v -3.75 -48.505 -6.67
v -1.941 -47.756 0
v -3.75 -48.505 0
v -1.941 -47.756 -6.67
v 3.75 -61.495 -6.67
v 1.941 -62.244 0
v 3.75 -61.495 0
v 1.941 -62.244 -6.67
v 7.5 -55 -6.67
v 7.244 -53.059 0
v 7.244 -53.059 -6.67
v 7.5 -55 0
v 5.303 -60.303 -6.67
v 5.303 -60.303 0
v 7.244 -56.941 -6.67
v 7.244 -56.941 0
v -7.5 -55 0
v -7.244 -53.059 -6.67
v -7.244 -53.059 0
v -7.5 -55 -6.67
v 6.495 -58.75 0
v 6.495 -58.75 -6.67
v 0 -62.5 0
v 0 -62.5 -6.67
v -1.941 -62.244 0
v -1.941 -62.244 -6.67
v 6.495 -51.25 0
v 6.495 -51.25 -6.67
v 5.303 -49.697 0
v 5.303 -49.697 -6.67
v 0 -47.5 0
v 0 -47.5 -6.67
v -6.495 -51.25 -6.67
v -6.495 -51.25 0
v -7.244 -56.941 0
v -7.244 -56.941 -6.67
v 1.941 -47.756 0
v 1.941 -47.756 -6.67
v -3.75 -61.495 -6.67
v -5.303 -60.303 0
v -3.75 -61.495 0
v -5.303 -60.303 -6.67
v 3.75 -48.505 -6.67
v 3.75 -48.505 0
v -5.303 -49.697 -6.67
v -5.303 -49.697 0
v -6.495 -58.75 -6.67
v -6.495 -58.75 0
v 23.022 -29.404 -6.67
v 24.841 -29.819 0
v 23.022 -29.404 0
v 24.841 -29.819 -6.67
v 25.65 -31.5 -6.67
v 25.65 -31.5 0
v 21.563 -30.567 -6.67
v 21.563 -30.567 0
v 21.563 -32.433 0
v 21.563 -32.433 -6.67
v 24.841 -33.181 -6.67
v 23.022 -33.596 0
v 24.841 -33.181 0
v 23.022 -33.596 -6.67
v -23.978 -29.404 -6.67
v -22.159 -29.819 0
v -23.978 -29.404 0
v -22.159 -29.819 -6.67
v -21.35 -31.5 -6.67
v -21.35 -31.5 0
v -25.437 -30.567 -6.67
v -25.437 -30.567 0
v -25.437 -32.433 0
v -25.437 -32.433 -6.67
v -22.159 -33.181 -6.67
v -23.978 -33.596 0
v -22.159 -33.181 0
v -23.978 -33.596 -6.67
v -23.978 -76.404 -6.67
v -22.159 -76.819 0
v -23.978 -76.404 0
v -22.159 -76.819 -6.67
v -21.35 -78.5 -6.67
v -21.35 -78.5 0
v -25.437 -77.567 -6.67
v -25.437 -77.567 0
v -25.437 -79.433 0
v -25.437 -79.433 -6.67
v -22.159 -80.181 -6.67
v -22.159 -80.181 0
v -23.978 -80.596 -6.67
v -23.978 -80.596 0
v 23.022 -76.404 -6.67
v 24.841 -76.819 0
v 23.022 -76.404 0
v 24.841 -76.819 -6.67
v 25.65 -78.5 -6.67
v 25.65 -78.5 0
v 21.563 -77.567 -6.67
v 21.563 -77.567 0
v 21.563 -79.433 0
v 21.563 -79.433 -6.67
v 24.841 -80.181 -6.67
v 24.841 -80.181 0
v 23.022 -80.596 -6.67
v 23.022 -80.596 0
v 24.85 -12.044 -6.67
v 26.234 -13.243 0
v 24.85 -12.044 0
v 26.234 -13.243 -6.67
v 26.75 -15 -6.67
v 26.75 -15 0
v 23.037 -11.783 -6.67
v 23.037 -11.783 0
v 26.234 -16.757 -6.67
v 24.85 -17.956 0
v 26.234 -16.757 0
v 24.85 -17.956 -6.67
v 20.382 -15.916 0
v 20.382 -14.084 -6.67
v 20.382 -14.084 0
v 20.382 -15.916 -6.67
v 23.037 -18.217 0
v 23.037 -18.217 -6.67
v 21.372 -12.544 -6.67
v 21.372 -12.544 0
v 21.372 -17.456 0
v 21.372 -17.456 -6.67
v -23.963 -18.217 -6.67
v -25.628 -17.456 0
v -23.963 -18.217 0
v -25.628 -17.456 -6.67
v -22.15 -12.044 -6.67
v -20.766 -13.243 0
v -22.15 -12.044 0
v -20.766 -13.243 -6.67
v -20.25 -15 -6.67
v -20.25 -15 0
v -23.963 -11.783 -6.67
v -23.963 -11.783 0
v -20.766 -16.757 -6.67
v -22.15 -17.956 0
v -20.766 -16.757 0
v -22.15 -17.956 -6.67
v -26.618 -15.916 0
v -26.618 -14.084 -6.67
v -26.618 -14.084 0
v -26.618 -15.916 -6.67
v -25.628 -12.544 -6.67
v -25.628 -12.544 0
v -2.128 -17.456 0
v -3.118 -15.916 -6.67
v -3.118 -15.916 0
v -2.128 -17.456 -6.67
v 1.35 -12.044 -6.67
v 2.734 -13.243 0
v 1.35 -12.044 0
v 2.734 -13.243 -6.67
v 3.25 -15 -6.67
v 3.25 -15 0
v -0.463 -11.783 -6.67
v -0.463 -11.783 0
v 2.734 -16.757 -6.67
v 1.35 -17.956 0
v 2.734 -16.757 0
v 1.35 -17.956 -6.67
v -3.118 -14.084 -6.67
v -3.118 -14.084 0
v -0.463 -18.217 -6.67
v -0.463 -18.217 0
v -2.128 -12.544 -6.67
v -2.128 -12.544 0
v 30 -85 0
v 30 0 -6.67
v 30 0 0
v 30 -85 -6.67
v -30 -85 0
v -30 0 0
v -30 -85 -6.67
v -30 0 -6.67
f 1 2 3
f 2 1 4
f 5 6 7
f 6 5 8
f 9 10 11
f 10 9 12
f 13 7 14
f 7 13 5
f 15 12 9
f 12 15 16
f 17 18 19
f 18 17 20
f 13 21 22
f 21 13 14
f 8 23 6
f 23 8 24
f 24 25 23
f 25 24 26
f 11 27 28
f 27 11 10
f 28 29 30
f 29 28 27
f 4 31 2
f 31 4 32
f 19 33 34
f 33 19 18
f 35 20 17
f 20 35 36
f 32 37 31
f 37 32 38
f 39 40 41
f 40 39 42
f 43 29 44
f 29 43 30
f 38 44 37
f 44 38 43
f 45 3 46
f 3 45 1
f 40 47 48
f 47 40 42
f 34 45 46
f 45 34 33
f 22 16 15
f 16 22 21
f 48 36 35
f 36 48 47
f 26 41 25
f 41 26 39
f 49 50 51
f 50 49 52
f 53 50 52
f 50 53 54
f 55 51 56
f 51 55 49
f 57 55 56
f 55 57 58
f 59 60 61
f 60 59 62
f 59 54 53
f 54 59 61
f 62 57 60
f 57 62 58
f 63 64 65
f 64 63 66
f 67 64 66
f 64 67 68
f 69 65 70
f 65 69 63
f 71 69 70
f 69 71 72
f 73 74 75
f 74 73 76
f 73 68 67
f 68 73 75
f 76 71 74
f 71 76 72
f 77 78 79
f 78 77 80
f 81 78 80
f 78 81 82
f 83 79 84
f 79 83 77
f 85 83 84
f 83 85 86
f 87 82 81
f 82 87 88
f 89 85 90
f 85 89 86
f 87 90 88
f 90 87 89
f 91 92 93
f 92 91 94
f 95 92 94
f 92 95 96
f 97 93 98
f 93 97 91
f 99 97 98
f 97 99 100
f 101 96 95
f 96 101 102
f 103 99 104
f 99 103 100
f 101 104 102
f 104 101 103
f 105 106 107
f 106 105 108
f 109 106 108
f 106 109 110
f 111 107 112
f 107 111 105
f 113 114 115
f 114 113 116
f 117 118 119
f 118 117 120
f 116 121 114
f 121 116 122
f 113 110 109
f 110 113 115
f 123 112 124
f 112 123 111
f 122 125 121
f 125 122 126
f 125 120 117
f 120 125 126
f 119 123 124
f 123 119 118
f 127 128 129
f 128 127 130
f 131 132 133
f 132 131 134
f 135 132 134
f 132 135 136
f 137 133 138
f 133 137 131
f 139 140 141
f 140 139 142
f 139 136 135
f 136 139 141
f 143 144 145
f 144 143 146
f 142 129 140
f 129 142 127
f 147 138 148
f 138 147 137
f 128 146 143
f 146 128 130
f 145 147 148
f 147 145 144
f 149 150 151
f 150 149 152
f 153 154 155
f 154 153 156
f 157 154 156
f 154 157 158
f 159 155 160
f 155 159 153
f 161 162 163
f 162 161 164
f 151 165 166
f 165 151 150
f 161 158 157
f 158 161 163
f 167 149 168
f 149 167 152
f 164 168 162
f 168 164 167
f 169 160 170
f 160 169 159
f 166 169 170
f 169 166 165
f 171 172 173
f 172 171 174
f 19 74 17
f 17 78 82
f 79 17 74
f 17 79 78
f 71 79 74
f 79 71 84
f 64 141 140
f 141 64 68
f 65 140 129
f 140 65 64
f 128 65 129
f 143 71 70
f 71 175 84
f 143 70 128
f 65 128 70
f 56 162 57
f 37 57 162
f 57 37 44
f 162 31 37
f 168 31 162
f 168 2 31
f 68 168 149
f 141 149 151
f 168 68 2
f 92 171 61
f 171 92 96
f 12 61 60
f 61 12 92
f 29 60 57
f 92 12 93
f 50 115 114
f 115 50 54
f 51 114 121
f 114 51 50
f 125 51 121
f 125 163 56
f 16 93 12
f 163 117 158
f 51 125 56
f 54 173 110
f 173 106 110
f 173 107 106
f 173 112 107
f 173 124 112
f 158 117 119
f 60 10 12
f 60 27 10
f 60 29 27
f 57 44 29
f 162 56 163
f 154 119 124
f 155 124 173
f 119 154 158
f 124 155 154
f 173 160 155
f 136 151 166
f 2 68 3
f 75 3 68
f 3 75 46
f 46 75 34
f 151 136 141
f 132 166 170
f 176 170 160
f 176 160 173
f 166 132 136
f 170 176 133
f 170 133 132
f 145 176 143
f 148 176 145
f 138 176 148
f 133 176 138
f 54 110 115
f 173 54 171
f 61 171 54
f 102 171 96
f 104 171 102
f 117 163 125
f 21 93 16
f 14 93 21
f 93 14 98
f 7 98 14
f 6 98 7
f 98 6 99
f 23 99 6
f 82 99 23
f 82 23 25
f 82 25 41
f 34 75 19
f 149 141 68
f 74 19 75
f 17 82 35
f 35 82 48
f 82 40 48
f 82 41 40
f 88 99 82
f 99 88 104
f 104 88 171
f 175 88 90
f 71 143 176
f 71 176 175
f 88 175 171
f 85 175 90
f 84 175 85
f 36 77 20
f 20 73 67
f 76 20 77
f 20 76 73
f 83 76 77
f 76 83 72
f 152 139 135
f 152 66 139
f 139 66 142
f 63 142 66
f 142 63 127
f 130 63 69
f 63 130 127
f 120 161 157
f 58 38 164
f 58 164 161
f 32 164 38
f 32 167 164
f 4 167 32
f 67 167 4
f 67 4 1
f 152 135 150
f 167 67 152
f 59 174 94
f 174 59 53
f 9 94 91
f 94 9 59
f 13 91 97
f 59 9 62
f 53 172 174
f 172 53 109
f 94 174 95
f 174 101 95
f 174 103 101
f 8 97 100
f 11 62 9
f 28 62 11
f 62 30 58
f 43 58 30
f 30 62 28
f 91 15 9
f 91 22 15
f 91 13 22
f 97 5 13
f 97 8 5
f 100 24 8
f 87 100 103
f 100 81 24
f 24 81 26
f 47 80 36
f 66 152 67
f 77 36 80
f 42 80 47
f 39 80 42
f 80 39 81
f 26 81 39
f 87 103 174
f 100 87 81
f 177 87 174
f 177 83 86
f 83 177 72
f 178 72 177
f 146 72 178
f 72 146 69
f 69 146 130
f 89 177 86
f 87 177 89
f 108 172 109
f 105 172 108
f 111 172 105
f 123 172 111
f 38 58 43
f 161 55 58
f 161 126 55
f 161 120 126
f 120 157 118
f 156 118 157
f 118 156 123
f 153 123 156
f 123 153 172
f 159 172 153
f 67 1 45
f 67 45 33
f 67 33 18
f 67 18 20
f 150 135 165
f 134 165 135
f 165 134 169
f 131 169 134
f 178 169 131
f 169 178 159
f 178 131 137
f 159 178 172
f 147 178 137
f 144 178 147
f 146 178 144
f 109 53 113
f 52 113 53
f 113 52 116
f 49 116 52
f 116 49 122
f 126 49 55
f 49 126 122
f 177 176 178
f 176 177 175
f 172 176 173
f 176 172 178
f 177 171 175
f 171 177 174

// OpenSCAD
plate_x = 60;
plate_y = 85;
plate_z = 6.67;

difference() {
    translate ([0,-plate_y/2,-plate_z/2]) cube([plate_x,plate_y,plate_z], center=true);
    translate ([0,-15,0]) holecuts();
}


module holecuts(){
    translate ([+47/2,0.0]) cylinder(d=6.5, h=100, center=true);
    translate ([-47/2,0.0]) cylinder(d=6.5, h=100, center=true);
    cylinder(d=6.5, h=100, center=true);
    translate ([0,-40,0]) nema23_holes();
}


module nema23_holes(){
    cylinder(d=15, h=100, center=true);         // middle opening
    // Mounting screws
    translate ([+47/2,+47/2.0]) cylinder(d=4.3, h=100, center=true);
    translate ([-47/2,+47/2.0]) cylinder(d=4.3, h=100, center=true);
    translate ([-47/2,-47/2.0]) cylinder(d=4.3, h=100, center=true);
    translate ([+47/2,-47/2.0]) cylinder(d=4.3, h=100, center=true);
}
